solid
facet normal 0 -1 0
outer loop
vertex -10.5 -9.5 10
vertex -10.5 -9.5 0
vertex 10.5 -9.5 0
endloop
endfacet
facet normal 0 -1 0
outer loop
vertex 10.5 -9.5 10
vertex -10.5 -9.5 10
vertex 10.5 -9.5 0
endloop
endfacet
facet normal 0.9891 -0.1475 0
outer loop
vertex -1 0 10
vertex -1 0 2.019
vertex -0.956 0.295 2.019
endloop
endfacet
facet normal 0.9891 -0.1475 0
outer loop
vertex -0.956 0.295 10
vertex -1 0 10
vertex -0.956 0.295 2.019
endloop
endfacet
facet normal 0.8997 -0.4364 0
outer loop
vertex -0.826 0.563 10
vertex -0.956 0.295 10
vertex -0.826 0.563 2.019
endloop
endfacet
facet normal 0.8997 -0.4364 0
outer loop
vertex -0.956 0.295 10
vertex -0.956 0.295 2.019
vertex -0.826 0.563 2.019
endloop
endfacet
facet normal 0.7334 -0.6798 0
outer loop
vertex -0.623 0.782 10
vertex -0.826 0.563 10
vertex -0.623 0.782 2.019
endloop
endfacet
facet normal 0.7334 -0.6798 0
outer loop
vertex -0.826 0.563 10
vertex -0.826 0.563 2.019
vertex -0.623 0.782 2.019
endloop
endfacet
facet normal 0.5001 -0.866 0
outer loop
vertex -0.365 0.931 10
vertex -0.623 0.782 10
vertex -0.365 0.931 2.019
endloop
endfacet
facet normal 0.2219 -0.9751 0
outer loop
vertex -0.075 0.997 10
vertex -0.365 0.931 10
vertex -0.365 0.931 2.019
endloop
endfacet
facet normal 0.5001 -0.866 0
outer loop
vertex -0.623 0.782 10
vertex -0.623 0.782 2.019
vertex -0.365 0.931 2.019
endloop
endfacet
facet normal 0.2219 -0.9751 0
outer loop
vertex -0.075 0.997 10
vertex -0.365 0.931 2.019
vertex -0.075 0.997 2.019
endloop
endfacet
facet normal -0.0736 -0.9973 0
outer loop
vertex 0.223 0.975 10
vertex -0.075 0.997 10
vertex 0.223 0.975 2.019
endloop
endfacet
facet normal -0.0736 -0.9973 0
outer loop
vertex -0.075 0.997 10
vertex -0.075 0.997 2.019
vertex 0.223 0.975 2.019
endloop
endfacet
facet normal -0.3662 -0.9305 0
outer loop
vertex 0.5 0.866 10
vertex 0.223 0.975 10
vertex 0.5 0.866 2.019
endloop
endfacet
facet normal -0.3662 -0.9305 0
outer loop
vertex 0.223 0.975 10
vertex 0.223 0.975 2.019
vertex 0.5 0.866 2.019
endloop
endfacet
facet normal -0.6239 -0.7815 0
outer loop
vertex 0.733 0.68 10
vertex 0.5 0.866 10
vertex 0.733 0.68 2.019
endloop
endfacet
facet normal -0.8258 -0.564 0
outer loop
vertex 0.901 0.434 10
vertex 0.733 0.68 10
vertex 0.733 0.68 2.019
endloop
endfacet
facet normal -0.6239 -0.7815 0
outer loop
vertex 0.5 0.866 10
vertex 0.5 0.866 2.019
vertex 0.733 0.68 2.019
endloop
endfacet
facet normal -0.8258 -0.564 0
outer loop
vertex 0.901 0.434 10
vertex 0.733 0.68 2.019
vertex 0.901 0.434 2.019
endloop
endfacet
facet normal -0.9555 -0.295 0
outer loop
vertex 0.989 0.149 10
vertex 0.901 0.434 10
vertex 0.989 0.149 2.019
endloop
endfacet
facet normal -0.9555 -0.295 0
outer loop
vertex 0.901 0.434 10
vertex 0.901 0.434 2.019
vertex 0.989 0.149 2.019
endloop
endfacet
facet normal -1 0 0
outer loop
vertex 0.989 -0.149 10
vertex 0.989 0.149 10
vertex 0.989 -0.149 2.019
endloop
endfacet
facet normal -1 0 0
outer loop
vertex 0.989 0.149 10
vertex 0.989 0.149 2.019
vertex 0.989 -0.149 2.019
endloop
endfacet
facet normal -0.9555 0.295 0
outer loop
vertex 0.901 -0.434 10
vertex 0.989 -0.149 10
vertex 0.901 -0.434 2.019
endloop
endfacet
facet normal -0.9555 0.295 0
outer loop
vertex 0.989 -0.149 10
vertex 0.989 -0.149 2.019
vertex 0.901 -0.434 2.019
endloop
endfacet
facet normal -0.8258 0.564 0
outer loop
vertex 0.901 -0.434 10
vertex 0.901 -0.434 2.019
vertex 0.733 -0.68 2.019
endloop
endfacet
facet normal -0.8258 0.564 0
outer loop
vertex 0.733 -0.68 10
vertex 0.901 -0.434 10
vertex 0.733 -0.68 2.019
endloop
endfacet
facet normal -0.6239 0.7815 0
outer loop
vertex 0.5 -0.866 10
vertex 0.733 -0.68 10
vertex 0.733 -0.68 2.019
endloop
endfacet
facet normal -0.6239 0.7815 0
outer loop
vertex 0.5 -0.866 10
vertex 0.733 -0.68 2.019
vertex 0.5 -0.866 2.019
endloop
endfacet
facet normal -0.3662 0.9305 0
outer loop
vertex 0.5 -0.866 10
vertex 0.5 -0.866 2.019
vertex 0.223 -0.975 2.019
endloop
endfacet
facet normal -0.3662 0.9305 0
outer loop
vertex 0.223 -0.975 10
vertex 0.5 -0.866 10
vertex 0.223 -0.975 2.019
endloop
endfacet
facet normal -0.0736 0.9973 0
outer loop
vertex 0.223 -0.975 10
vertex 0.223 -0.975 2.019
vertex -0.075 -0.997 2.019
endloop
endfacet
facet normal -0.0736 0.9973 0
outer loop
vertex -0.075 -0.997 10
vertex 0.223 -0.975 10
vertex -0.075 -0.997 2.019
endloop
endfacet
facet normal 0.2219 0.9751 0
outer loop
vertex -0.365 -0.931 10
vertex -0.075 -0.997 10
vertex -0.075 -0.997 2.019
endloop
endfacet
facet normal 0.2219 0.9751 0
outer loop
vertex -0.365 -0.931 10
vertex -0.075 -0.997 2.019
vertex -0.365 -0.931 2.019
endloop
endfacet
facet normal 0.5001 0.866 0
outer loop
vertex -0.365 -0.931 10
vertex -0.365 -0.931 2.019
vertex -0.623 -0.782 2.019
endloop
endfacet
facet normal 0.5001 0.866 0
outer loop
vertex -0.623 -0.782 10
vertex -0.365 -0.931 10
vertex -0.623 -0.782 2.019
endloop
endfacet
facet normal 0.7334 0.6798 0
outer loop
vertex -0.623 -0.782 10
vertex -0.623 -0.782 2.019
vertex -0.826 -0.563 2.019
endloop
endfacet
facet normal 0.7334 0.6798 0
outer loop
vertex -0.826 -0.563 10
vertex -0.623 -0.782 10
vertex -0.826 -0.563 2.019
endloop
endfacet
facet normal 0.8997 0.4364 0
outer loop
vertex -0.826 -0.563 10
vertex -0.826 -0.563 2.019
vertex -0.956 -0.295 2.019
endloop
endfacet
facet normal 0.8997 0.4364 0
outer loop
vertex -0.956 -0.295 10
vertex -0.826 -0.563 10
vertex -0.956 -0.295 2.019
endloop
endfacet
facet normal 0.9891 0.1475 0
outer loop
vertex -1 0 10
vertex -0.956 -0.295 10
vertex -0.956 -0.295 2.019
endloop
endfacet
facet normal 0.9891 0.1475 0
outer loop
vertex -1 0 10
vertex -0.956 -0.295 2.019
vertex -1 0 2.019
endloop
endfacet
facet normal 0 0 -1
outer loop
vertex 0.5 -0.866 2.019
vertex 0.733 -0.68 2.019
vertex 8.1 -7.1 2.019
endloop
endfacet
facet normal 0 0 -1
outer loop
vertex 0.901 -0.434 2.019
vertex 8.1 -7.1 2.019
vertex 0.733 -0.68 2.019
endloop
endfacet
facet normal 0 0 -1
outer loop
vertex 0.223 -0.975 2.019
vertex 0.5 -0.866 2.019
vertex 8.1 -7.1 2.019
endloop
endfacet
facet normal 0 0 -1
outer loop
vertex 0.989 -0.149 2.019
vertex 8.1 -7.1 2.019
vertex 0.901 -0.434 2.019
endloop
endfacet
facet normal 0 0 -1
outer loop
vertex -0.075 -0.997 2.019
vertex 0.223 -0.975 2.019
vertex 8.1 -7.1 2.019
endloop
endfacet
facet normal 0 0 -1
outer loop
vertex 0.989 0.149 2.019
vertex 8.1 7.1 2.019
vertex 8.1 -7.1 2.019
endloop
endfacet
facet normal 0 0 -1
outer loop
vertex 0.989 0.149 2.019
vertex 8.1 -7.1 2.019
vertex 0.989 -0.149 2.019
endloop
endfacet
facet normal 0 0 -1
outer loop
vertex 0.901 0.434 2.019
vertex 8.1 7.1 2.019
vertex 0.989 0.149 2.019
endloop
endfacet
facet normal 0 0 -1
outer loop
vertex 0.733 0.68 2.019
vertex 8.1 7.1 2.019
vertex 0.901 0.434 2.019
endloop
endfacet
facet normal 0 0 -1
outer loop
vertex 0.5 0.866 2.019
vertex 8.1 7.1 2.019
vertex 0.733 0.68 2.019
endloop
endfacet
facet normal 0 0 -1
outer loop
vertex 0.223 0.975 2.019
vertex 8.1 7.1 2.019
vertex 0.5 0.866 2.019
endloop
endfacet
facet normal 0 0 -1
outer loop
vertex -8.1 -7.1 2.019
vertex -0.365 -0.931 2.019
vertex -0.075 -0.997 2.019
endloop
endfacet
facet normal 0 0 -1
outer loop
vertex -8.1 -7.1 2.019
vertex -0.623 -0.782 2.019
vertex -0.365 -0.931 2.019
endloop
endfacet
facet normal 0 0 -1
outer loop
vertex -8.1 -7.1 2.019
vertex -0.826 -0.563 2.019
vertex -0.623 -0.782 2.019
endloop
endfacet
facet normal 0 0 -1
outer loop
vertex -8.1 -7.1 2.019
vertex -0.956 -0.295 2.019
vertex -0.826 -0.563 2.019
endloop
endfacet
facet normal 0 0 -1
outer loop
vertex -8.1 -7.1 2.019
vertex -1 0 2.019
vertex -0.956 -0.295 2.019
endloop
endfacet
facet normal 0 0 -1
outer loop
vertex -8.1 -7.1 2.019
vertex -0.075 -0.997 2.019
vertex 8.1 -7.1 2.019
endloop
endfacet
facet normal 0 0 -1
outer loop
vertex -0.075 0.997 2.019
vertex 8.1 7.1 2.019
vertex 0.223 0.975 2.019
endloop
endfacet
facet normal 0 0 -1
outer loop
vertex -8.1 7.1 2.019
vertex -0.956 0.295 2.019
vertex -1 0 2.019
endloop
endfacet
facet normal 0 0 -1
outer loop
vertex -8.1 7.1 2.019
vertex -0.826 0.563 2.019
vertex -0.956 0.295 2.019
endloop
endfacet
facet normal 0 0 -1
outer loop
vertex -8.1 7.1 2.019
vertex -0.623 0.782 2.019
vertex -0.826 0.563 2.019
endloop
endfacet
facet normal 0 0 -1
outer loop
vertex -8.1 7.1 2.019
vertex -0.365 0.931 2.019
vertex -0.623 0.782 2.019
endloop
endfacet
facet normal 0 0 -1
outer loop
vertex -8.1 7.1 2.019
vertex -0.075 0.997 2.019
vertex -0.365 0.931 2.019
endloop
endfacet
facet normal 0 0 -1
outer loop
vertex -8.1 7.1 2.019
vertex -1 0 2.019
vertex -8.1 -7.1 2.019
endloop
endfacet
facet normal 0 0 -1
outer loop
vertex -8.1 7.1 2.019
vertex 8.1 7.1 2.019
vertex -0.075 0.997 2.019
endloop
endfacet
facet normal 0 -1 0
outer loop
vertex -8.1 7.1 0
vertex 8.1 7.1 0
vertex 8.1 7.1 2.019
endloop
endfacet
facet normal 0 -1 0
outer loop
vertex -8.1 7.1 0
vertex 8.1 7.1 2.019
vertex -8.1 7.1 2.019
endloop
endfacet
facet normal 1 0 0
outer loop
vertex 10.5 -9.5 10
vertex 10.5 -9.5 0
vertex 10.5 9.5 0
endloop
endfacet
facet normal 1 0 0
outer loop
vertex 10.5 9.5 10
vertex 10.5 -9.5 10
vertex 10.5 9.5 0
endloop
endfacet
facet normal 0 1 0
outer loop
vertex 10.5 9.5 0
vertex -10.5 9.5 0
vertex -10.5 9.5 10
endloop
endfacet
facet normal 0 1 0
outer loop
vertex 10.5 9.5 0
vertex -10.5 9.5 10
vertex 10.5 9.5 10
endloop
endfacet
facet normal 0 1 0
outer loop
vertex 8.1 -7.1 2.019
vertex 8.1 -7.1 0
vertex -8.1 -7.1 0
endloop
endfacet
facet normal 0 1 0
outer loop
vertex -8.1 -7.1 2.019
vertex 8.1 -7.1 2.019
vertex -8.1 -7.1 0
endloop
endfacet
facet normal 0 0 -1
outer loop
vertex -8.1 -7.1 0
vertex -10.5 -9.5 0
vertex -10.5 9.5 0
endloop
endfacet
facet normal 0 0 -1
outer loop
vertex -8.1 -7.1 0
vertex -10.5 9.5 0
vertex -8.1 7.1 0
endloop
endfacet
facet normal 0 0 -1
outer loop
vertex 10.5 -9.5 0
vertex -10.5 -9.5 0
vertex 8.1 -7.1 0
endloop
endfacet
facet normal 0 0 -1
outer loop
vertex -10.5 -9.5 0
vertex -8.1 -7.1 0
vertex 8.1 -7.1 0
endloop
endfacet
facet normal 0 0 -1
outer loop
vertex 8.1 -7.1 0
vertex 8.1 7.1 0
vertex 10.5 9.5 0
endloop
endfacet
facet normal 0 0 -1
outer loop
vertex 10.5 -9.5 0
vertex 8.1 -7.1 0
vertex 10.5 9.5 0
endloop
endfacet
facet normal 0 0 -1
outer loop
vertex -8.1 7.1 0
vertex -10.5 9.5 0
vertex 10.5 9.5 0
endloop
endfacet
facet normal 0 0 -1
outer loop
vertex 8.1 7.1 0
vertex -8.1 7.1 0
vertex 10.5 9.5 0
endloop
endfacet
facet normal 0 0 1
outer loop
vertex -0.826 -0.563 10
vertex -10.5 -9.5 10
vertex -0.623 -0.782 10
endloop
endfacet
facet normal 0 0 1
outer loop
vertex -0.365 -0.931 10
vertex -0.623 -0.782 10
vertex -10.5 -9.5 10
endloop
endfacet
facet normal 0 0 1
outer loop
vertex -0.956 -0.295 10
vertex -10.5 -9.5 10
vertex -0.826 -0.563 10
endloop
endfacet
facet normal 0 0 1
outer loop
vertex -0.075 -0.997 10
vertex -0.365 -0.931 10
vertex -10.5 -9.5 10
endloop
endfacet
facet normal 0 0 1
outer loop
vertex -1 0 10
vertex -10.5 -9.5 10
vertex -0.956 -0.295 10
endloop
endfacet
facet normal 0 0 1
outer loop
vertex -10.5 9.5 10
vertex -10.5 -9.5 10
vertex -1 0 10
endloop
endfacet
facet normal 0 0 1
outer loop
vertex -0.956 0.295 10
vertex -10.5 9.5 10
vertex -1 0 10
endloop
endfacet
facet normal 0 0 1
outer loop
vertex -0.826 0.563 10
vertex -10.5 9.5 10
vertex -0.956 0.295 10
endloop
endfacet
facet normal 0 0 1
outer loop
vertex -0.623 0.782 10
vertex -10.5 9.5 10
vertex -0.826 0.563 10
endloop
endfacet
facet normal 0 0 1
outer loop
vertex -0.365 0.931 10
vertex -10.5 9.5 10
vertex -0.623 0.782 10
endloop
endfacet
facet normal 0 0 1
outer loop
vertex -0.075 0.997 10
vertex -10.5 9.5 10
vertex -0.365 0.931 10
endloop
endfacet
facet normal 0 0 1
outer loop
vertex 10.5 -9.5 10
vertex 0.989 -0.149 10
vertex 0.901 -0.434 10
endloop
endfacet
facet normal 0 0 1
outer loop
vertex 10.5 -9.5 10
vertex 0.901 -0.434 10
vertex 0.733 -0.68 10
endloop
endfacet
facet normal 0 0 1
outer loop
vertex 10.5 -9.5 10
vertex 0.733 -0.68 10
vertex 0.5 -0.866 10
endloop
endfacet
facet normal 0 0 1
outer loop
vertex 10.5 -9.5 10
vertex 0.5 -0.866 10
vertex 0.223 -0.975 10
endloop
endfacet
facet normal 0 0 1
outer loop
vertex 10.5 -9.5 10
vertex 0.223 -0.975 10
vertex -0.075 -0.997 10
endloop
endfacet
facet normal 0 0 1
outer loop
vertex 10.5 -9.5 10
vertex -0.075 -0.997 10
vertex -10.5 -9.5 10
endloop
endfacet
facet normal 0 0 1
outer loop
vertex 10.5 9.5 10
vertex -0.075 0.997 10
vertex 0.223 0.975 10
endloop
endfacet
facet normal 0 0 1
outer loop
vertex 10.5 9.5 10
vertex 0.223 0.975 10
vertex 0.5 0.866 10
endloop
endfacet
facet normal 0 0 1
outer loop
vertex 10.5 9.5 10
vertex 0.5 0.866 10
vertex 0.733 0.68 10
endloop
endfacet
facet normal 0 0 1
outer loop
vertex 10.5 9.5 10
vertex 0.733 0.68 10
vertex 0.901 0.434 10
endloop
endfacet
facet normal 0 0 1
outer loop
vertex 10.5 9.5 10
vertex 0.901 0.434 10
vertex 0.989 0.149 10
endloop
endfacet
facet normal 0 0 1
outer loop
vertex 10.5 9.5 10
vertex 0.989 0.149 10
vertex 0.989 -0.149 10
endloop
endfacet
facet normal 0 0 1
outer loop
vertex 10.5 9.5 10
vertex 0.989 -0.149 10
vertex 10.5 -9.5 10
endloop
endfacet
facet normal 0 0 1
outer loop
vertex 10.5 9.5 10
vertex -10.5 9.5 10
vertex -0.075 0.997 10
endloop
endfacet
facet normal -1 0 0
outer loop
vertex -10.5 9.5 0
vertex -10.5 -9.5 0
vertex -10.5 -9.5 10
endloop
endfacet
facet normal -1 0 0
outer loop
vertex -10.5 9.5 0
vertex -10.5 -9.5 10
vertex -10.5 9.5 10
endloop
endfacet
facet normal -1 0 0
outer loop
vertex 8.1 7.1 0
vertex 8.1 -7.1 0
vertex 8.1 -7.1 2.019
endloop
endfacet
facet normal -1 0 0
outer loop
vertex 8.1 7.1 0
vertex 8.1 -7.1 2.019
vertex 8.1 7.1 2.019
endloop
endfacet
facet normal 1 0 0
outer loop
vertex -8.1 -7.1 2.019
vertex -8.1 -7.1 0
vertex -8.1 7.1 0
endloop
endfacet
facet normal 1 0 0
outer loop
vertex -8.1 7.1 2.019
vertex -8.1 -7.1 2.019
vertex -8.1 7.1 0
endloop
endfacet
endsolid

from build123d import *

# Parameters (mm, degrees)
SKETCH1_W           = 21
SKETCH1_H           = 19
BOSS_EXTRUDE2_DEPTH = 10
SKETCH3_W           = 16.2
SKETCH3_H           = 14.2
CUT_EXTRUDE1_DEPTH  = 2.019279387
SKETCH4_R           = 1
CUT_EXTRUDE2_DEPTH  = 8


with BuildPart() as part:
    # Sketch1 → Boss-Extrude2 (new body)
    with BuildSketch(Plane.XY):
        Rectangle(SKETCH1_W, SKETCH1_H)
    extrude(amount=BOSS_EXTRUDE2_DEPTH)

    # Sketch3 → Cut-Extrude1 (cut)
    with BuildSketch(Plane(origin=(0, 0, 0), x_dir=(-1, 0, 0), z_dir=(0, 0, -1))):
        Rectangle(SKETCH3_W, SKETCH3_H)
    extrude(amount=-CUT_EXTRUDE1_DEPTH, mode=Mode.SUBTRACT)

    # Sketch4 → Cut-Extrude2 (cut)
    with BuildSketch(Plane(origin=(0, 0, 2.019279387), x_dir=(-1, 0, 0), z_dir=(0, 0, -1))):
        Circle(SKETCH4_R)
    extrude(amount=-CUT_EXTRUDE2_DEPTH, mode=Mode.SUBTRACT)


solid = part.part
